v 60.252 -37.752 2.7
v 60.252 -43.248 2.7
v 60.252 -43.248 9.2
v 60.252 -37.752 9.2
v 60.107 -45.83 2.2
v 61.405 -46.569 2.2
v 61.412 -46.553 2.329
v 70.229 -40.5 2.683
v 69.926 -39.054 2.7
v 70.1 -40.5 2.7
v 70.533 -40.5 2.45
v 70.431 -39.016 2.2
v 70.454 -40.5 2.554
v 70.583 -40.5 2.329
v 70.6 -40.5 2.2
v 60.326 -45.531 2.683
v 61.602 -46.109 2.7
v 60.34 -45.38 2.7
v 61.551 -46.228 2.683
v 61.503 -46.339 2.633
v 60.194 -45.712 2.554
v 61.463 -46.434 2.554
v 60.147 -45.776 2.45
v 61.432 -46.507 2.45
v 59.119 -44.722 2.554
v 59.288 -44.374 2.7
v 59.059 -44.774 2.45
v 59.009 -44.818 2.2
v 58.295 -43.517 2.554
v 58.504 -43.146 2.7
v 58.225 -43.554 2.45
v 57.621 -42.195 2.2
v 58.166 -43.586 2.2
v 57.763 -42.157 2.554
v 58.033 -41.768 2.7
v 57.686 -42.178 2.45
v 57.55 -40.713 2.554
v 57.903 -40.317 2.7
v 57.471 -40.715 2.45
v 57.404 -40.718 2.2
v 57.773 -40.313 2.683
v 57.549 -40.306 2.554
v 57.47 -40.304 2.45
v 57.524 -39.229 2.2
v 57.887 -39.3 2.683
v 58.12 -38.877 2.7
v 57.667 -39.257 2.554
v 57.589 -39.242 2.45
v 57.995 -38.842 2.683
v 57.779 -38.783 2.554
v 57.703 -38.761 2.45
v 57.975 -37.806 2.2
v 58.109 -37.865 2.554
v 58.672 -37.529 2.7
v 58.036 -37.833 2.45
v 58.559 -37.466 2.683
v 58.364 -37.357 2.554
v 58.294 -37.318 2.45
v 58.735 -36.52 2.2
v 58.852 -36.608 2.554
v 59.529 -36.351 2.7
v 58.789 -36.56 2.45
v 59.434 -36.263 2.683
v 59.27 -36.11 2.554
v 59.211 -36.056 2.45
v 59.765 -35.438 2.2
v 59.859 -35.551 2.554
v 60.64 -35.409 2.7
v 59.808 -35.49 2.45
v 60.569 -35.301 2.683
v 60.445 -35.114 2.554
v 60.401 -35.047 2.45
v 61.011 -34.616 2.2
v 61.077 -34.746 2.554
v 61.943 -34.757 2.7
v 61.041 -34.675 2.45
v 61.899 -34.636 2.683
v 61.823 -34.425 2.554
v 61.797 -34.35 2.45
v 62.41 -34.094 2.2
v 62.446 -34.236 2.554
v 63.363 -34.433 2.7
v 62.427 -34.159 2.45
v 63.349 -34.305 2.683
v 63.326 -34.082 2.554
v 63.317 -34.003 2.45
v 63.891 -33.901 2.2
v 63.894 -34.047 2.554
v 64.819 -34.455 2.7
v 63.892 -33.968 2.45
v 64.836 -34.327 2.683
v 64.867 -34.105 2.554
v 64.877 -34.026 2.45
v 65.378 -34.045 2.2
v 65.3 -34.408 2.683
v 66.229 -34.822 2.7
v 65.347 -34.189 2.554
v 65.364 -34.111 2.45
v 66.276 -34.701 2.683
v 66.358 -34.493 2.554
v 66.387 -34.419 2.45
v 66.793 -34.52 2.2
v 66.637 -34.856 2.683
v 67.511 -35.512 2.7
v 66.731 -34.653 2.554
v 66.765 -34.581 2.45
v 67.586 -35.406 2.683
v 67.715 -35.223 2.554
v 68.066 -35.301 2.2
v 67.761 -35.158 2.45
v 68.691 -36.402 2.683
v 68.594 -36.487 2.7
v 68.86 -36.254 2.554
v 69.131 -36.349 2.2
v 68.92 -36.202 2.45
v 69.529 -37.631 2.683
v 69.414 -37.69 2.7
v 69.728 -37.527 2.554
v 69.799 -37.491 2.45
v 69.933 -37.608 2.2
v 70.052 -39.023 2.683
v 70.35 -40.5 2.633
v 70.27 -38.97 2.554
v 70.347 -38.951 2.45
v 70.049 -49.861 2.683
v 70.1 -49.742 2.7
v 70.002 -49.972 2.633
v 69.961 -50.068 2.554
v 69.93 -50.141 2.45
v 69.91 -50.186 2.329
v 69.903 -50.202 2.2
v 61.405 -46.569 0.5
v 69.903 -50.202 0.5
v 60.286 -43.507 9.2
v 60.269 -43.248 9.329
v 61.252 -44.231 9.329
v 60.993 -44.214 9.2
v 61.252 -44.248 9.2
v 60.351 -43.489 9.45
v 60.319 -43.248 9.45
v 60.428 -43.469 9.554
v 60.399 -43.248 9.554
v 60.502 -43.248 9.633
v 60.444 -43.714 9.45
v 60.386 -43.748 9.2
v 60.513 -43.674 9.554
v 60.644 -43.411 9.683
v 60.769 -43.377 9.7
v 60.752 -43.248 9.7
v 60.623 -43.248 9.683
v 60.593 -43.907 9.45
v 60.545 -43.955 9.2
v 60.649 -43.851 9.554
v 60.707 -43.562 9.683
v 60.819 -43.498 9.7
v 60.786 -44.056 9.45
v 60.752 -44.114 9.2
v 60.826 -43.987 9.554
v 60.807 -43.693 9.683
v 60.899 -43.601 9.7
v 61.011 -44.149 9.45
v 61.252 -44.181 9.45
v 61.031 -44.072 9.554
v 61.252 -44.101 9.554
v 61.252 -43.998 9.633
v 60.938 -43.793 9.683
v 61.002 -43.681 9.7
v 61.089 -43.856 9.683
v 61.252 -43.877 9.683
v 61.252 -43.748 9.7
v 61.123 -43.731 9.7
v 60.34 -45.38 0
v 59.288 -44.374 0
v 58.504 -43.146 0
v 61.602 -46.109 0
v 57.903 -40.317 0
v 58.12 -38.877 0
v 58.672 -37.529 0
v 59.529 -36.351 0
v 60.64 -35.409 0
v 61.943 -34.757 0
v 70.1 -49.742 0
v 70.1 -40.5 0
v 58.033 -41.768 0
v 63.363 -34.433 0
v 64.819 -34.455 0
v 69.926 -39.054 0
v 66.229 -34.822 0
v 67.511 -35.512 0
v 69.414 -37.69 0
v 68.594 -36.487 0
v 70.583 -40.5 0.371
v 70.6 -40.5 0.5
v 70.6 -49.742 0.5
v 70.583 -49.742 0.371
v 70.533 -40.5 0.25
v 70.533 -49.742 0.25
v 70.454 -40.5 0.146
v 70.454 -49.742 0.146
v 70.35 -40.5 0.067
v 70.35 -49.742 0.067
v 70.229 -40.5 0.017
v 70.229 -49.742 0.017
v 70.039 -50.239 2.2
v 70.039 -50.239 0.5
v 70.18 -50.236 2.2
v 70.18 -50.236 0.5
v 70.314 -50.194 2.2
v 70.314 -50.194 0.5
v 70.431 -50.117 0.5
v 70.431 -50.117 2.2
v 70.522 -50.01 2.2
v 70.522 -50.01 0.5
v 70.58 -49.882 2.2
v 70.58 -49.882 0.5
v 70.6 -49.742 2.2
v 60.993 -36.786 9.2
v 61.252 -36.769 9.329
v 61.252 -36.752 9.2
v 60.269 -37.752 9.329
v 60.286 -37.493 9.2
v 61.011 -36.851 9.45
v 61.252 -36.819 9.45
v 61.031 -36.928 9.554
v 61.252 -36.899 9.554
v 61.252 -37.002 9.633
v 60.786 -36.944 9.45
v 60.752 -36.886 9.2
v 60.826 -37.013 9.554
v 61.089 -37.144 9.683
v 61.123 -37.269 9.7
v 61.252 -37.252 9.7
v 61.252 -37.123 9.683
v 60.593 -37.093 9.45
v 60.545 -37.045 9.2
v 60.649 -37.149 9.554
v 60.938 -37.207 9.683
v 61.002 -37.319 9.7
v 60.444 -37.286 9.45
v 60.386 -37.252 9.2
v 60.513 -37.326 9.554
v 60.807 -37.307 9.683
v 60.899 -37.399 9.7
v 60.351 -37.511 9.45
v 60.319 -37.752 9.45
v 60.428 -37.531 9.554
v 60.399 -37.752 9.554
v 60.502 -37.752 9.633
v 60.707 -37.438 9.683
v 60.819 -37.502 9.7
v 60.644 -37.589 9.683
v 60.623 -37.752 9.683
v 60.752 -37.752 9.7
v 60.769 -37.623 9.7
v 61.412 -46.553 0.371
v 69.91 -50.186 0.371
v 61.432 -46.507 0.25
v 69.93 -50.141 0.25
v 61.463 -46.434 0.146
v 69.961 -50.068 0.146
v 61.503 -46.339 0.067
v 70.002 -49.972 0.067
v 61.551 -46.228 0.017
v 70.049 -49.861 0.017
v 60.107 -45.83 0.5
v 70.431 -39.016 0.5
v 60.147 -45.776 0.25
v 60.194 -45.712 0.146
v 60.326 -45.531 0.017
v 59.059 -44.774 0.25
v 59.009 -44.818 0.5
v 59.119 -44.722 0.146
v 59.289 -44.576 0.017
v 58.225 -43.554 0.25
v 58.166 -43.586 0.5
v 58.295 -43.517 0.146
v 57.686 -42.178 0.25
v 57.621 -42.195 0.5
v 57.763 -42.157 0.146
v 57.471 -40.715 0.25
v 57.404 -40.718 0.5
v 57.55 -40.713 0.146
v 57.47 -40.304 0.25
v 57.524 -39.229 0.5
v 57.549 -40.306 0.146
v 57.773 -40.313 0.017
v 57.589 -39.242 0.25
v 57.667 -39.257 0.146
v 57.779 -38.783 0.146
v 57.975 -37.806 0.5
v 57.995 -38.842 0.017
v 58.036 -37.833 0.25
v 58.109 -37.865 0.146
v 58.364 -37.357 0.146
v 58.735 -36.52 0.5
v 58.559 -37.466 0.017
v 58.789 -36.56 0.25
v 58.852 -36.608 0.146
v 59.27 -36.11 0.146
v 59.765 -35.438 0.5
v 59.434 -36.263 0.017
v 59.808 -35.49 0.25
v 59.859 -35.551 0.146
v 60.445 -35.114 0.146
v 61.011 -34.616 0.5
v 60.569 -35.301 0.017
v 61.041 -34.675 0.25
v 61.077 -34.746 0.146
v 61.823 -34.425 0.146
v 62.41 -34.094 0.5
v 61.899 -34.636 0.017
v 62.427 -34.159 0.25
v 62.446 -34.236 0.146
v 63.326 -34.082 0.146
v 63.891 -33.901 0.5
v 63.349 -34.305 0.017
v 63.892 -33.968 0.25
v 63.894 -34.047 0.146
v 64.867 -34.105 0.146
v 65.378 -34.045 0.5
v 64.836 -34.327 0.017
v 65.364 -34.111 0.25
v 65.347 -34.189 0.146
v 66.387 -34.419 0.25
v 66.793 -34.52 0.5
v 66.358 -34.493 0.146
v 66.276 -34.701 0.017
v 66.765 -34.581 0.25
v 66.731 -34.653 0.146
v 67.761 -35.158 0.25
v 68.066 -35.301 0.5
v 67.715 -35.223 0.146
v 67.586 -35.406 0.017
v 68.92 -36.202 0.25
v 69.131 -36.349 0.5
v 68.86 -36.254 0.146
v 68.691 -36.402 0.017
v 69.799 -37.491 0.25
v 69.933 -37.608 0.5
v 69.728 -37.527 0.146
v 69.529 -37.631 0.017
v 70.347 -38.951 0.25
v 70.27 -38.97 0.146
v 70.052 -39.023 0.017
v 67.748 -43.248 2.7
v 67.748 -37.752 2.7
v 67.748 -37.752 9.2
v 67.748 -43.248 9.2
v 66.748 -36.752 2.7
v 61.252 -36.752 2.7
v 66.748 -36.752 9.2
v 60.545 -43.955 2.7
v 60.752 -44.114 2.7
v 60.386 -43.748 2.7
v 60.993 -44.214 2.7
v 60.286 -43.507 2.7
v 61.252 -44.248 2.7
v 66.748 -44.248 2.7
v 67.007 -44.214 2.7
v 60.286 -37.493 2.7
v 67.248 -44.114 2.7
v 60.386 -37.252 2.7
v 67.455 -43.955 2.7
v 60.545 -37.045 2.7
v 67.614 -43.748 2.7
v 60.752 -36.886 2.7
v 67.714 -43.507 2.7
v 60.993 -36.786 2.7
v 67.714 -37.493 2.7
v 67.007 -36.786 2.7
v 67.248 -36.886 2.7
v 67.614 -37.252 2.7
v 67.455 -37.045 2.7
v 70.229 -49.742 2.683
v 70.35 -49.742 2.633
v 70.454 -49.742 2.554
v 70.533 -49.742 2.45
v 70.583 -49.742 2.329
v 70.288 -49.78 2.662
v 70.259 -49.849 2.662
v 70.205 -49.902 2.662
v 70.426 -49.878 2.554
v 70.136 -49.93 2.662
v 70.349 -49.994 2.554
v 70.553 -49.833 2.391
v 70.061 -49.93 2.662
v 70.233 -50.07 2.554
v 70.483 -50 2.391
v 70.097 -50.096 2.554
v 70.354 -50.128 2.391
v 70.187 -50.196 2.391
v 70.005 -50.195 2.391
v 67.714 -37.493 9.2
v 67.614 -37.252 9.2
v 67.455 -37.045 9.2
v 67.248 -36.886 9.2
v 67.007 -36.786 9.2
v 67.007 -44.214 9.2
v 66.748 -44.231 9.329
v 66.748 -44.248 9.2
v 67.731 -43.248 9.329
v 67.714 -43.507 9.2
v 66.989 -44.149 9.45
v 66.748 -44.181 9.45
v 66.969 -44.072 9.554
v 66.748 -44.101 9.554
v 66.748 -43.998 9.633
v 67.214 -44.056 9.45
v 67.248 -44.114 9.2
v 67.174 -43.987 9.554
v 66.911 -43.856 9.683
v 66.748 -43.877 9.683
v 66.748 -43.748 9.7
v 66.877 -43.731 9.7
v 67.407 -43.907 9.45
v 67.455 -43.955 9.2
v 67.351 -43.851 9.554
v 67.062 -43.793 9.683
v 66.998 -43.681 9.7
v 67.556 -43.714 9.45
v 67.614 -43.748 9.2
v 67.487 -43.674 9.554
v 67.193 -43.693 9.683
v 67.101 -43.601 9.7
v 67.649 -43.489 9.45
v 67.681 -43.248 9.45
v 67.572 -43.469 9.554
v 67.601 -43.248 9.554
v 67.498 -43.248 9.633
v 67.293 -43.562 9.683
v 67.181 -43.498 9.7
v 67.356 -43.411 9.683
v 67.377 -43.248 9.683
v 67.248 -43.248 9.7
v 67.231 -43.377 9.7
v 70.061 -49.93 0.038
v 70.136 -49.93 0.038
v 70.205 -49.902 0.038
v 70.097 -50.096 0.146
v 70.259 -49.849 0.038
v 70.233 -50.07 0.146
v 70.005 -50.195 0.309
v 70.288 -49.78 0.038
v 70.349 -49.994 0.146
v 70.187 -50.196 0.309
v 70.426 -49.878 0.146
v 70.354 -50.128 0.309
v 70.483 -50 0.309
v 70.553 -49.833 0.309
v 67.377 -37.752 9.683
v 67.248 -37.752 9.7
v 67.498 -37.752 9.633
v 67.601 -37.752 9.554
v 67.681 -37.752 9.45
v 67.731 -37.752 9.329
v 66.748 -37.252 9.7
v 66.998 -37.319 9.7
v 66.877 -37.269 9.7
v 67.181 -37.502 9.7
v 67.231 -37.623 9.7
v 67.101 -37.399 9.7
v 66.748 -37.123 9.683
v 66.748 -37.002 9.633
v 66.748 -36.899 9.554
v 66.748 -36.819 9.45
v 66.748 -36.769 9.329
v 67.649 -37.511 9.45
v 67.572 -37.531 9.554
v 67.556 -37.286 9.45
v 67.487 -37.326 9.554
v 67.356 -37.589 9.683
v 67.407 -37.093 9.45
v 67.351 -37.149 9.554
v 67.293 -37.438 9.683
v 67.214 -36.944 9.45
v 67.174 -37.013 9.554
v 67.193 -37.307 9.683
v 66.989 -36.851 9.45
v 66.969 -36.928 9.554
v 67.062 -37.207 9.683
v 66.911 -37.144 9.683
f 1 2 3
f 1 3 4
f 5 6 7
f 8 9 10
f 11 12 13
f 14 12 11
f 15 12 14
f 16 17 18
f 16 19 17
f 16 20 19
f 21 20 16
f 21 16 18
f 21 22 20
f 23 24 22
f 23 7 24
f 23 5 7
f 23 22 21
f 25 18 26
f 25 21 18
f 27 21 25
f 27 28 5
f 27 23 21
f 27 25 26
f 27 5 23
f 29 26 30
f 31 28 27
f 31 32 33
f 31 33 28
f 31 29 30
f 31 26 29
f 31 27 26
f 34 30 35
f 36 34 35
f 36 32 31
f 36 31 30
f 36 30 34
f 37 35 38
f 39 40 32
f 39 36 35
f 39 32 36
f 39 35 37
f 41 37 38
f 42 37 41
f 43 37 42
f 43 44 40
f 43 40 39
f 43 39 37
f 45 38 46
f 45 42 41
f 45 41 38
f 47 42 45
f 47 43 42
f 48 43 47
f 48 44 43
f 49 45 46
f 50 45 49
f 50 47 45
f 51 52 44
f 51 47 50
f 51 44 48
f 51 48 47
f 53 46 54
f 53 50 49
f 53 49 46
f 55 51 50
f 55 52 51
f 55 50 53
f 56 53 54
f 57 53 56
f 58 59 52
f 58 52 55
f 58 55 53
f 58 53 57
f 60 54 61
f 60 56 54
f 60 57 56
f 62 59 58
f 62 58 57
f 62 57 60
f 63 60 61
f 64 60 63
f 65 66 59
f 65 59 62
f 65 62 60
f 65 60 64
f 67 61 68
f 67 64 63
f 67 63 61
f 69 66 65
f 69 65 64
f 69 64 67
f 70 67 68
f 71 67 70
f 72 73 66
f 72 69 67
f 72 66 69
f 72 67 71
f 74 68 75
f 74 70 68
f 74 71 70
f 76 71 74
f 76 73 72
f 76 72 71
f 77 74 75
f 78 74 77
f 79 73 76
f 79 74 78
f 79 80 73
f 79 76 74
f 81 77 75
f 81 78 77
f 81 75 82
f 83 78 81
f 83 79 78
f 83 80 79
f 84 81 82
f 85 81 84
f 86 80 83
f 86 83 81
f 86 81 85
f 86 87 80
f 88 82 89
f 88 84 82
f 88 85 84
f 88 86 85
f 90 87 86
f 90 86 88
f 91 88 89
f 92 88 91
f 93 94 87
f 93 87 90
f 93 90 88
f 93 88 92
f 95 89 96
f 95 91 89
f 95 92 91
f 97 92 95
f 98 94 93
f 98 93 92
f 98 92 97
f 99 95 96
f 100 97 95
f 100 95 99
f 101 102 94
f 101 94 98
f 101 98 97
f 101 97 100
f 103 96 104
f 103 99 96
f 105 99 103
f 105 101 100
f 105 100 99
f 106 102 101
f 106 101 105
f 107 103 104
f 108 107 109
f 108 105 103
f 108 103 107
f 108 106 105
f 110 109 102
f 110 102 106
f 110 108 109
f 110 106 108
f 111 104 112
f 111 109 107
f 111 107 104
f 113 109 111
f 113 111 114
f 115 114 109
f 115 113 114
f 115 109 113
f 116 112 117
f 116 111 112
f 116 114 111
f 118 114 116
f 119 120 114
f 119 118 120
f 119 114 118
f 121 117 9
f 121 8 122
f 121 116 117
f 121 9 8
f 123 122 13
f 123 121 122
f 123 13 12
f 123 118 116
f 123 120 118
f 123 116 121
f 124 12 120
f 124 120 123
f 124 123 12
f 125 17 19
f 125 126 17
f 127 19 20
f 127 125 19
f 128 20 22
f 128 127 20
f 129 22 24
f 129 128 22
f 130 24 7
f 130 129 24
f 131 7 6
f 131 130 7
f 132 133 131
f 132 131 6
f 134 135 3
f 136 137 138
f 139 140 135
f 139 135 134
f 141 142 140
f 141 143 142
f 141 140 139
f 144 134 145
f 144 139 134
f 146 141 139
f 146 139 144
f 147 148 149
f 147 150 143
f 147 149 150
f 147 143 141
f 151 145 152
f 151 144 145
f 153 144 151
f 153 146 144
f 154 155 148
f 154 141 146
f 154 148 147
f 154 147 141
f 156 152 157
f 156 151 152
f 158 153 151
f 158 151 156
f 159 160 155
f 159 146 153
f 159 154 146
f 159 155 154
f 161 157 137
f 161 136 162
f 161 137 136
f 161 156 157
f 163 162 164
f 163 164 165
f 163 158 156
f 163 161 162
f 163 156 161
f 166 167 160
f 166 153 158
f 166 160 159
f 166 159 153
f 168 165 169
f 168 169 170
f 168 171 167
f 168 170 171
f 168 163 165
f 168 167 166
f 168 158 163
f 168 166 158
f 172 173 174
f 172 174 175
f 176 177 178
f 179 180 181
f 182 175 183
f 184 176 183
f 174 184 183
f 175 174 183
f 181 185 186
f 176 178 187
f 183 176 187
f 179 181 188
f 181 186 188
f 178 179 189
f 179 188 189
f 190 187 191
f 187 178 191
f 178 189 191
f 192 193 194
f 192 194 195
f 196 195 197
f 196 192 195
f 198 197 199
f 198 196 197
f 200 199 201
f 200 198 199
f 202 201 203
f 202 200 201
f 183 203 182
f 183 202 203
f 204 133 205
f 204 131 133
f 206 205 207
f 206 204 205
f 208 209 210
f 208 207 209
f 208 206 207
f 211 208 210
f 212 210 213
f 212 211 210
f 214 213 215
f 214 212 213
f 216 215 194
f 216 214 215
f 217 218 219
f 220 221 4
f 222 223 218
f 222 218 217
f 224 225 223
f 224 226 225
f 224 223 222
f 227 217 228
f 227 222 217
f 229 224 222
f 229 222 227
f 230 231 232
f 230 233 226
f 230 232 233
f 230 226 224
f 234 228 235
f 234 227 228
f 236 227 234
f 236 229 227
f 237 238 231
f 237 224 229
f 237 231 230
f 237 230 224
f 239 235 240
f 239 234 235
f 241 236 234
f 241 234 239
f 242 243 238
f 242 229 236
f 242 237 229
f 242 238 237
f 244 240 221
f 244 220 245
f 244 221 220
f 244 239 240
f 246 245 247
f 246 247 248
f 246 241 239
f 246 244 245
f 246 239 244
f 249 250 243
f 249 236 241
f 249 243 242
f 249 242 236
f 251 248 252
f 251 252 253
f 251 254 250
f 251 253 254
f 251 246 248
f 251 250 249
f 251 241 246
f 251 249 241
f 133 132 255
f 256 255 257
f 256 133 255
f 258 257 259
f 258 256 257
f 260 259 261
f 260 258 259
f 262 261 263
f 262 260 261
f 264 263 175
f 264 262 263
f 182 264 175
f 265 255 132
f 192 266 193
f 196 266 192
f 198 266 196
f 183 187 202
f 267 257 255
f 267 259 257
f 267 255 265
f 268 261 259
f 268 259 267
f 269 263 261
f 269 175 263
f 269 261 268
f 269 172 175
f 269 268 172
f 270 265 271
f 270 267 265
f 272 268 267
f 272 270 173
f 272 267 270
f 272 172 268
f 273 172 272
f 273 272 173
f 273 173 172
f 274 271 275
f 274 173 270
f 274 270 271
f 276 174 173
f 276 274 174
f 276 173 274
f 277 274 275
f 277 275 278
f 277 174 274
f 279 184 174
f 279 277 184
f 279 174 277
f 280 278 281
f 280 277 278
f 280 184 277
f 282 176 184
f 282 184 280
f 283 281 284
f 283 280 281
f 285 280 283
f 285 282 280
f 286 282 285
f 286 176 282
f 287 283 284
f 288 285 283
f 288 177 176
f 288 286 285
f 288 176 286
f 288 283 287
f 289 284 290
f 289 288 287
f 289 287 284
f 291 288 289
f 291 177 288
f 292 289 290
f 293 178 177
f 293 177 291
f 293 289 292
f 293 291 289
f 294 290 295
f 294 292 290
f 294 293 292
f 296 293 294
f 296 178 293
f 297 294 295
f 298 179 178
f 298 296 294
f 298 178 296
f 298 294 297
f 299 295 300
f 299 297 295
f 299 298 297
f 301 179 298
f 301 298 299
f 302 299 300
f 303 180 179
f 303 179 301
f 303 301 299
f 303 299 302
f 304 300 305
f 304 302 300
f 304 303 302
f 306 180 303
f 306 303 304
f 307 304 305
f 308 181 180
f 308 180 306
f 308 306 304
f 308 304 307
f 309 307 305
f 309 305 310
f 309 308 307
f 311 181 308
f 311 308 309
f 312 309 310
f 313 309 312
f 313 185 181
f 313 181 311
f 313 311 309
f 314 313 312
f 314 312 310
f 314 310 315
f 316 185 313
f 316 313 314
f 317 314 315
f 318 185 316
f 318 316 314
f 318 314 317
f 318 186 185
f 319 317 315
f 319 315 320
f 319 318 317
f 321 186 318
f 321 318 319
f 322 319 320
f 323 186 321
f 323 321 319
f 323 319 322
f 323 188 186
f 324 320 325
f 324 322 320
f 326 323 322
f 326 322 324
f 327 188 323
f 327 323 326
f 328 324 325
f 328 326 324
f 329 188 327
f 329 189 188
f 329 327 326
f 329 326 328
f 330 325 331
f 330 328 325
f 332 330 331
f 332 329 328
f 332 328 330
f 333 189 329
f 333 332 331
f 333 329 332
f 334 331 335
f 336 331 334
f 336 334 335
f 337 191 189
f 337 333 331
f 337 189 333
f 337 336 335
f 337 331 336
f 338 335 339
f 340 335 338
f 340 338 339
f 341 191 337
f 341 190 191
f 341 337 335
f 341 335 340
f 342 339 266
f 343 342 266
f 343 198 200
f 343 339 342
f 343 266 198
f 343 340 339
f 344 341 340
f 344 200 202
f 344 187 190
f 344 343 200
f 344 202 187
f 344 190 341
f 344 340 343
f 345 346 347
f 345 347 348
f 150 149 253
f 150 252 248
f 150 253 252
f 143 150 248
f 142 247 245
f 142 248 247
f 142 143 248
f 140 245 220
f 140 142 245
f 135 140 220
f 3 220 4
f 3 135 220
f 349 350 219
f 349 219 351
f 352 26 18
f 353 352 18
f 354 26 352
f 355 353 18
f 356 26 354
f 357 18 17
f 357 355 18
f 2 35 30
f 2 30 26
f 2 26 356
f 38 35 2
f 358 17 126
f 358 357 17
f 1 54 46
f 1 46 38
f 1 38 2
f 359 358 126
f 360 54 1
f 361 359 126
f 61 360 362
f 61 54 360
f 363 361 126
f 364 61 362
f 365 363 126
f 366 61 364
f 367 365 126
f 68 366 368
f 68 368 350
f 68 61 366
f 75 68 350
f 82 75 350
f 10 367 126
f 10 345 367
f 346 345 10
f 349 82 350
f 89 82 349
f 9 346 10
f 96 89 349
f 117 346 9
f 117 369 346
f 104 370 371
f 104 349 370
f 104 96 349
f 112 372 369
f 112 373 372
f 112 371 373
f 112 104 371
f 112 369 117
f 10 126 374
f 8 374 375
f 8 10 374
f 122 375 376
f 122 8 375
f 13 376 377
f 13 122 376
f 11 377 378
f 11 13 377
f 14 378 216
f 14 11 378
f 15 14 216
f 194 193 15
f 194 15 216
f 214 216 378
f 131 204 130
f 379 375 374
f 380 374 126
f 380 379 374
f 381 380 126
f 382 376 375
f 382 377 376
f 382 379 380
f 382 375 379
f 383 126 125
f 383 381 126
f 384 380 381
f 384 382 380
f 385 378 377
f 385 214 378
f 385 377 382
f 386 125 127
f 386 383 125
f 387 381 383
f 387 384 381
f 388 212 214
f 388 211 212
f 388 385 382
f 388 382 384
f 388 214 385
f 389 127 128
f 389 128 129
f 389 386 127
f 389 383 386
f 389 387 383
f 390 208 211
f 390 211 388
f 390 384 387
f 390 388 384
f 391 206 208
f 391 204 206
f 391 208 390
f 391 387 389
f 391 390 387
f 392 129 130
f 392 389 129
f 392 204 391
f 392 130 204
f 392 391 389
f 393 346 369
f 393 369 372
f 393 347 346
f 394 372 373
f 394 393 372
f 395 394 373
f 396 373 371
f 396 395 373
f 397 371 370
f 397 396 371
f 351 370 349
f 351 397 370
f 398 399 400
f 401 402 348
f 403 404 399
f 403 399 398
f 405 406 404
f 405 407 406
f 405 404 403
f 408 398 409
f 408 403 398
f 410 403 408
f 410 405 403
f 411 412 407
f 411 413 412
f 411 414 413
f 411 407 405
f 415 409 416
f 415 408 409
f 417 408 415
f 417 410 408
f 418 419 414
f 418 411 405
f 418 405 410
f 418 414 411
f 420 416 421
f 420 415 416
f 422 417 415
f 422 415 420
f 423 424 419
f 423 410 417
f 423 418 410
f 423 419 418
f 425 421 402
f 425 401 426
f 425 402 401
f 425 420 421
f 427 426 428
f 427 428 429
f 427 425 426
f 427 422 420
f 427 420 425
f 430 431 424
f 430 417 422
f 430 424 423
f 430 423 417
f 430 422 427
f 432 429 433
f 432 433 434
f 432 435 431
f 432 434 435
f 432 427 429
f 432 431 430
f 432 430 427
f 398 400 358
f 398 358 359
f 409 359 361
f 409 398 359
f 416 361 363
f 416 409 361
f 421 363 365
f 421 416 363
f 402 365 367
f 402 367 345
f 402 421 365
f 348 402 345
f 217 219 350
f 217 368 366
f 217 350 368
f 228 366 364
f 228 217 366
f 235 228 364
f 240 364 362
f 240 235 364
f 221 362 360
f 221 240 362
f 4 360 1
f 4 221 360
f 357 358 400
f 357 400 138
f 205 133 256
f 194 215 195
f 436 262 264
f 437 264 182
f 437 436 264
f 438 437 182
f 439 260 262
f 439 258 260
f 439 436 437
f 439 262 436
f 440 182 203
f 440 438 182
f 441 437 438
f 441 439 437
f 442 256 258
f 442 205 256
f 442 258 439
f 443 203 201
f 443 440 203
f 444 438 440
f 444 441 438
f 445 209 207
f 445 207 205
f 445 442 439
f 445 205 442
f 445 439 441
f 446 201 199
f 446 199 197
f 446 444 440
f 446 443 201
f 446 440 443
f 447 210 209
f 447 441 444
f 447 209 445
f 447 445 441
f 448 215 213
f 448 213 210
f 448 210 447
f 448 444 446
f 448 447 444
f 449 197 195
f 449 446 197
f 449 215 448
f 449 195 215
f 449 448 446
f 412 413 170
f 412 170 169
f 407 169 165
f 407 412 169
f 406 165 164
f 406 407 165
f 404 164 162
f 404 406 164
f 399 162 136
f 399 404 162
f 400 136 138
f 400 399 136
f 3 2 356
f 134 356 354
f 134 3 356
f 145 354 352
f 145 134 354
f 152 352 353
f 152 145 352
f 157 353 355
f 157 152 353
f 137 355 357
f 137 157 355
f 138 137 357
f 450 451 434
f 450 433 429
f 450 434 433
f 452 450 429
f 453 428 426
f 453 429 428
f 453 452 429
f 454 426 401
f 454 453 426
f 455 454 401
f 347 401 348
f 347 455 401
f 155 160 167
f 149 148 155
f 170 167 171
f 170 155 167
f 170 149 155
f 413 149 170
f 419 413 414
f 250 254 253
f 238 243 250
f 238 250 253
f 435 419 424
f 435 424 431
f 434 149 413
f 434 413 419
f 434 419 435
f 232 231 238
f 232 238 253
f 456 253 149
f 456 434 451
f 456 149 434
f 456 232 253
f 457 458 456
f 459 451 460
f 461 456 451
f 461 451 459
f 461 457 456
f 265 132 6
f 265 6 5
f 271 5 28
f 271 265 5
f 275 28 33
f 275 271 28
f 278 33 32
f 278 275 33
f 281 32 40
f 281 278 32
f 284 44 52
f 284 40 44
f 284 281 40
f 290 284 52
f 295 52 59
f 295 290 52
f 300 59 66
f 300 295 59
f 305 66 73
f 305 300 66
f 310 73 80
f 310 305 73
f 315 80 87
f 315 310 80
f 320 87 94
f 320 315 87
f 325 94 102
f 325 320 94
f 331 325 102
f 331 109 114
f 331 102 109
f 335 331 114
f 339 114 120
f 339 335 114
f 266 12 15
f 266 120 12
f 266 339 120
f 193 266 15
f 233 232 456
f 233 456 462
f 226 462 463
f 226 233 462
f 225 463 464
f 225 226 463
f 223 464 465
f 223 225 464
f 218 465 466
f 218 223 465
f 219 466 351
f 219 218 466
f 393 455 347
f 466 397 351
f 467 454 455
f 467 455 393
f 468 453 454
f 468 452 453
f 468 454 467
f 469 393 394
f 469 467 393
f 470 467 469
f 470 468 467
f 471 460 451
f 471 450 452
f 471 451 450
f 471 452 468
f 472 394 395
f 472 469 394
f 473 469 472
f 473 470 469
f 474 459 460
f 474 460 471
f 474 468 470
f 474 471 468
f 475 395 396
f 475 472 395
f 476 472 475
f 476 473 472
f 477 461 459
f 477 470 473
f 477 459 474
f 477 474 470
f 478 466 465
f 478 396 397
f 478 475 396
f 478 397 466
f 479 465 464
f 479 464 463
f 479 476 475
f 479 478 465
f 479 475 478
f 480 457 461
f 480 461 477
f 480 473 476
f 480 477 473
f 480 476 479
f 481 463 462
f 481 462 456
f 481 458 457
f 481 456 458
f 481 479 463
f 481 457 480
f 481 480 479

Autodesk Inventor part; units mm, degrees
ref_plane "YZ Plane" through (0, 0, 0) normal (1, 0, 0) x (0, 1, 0)
ref_plane "XZ Plane" through (0, 0, 0) normal (0, 1, 0) x (-1, 0, 0)
ref_plane "XY Plane" through (0, 0, 0) normal (0, 0, 1) x (1, 0, 0)
ref_plane "Work Plane1" through (0, 0, 0) normal (0, 0, 1) x (1, 0, 0)
sketch "Sketch1" plane through (0, 0, 0) normal (0, 0, 1) x (1, 0, 0)
  line L0 (57, -9.5) -> (57, -71.5) projected
  line L1 (71, -71.5) -> (71, -9.5) projected
  line L2 (71, -40.5) -> (57, -40.5) construction
  circle A0 centre (64, -40.5) radius 7 construction
  circle A1 centre (64, -40.5) radius 6.6
  line L3 (70.6, -40.5) -> (70.6, -50.5)
  line L4 (70.6, -50.5) -> (61.4052, -46.5685)
  point P0 (0, 0)
  dimension "d0" = 0.4
  dimension "d1" = 10
extrude "Extrusion1" add sketch "Sketch1" along normal blind 2.7
sketch "Sketch2" plane through (0, 0, 2.7) normal (0, 0, 1) x (1, 0, 0)
  line L0 (61.4052, -46.5685) -> (70.6, -50.5) projected
  line L1 (70.6, -50.5) -> (70.6, -40.5) projected
  arc A0 (70.6, -40.5) -> (61.4052, -46.5685) centre (64, -40.5) ccw projected
  line L2 (58.5, -71.5) -> (58.5, -11) construction
  line L3 (69.5, -11) -> (69.5, -71.5) construction
  circle A1 centre (64, -40.5) radius 5.5 construction
  line L4 (60.2523, -36.7523) -> (67.7477, -36.7523)
  line L5 (67.7477, -36.7523) -> (67.7477, -44.2477)
  line L6 (67.7477, -44.2477) -> (60.2523, -44.2477)
  line L7 (60.2523, -44.2477) -> (60.2523, -36.7523)
  line L8 (60.0396, -36.6836) -> (67.9604, -44.3164) construction
  line L9 (67.7477, -36.7523) -> (60.2523, -44.2477) construction
  circle A2 centre (64, -40.5) radius 5.3
  point P0 (0, 0)
  dimension "d11" = 7.4953
  dimension "d12" = 7.4953
  dimension "d14" = 0.2
extrude "Extrusion2" add sketch "Sketch2" along normal blind 7 contours L4 L5 L6 L7
fillet "Fillet1" radius 1 4 edges at (60.2523, -44.2477, 6.2) (60.2523, -36.7523, 6.2) (67.7477, -36.7523, 6.2) (67.7477, -44.2477, 6.2)
fillet "Fillet2" radius 0.5 8 edges at (67.4548, -43.9548, 9.7) (67.7477, -40.5, 9.7) (67.4548, -37.0452, 9.7) (64, -36.7523, 9.7) (60.5452, -37.0452, 9.7) (60.2523, -40.5, 9.7) (60.5452, -43.9548, 9.7) (64, -44.2477, 9.7)
fillet "Fillet3" radius 0.5 7 edges at (60.3644, -34.9916, 2.7) (70.6, -45.5, 2.7) (66.0026, -48.5343, 2.7) (60.3644, -34.9916, 0) (70.6, -45.5, 0) (66.0026, -48.5343, 0) (70.6, -50.5, 1.35)
equation "\"d12\" = d11"
properties part number "Arm"
